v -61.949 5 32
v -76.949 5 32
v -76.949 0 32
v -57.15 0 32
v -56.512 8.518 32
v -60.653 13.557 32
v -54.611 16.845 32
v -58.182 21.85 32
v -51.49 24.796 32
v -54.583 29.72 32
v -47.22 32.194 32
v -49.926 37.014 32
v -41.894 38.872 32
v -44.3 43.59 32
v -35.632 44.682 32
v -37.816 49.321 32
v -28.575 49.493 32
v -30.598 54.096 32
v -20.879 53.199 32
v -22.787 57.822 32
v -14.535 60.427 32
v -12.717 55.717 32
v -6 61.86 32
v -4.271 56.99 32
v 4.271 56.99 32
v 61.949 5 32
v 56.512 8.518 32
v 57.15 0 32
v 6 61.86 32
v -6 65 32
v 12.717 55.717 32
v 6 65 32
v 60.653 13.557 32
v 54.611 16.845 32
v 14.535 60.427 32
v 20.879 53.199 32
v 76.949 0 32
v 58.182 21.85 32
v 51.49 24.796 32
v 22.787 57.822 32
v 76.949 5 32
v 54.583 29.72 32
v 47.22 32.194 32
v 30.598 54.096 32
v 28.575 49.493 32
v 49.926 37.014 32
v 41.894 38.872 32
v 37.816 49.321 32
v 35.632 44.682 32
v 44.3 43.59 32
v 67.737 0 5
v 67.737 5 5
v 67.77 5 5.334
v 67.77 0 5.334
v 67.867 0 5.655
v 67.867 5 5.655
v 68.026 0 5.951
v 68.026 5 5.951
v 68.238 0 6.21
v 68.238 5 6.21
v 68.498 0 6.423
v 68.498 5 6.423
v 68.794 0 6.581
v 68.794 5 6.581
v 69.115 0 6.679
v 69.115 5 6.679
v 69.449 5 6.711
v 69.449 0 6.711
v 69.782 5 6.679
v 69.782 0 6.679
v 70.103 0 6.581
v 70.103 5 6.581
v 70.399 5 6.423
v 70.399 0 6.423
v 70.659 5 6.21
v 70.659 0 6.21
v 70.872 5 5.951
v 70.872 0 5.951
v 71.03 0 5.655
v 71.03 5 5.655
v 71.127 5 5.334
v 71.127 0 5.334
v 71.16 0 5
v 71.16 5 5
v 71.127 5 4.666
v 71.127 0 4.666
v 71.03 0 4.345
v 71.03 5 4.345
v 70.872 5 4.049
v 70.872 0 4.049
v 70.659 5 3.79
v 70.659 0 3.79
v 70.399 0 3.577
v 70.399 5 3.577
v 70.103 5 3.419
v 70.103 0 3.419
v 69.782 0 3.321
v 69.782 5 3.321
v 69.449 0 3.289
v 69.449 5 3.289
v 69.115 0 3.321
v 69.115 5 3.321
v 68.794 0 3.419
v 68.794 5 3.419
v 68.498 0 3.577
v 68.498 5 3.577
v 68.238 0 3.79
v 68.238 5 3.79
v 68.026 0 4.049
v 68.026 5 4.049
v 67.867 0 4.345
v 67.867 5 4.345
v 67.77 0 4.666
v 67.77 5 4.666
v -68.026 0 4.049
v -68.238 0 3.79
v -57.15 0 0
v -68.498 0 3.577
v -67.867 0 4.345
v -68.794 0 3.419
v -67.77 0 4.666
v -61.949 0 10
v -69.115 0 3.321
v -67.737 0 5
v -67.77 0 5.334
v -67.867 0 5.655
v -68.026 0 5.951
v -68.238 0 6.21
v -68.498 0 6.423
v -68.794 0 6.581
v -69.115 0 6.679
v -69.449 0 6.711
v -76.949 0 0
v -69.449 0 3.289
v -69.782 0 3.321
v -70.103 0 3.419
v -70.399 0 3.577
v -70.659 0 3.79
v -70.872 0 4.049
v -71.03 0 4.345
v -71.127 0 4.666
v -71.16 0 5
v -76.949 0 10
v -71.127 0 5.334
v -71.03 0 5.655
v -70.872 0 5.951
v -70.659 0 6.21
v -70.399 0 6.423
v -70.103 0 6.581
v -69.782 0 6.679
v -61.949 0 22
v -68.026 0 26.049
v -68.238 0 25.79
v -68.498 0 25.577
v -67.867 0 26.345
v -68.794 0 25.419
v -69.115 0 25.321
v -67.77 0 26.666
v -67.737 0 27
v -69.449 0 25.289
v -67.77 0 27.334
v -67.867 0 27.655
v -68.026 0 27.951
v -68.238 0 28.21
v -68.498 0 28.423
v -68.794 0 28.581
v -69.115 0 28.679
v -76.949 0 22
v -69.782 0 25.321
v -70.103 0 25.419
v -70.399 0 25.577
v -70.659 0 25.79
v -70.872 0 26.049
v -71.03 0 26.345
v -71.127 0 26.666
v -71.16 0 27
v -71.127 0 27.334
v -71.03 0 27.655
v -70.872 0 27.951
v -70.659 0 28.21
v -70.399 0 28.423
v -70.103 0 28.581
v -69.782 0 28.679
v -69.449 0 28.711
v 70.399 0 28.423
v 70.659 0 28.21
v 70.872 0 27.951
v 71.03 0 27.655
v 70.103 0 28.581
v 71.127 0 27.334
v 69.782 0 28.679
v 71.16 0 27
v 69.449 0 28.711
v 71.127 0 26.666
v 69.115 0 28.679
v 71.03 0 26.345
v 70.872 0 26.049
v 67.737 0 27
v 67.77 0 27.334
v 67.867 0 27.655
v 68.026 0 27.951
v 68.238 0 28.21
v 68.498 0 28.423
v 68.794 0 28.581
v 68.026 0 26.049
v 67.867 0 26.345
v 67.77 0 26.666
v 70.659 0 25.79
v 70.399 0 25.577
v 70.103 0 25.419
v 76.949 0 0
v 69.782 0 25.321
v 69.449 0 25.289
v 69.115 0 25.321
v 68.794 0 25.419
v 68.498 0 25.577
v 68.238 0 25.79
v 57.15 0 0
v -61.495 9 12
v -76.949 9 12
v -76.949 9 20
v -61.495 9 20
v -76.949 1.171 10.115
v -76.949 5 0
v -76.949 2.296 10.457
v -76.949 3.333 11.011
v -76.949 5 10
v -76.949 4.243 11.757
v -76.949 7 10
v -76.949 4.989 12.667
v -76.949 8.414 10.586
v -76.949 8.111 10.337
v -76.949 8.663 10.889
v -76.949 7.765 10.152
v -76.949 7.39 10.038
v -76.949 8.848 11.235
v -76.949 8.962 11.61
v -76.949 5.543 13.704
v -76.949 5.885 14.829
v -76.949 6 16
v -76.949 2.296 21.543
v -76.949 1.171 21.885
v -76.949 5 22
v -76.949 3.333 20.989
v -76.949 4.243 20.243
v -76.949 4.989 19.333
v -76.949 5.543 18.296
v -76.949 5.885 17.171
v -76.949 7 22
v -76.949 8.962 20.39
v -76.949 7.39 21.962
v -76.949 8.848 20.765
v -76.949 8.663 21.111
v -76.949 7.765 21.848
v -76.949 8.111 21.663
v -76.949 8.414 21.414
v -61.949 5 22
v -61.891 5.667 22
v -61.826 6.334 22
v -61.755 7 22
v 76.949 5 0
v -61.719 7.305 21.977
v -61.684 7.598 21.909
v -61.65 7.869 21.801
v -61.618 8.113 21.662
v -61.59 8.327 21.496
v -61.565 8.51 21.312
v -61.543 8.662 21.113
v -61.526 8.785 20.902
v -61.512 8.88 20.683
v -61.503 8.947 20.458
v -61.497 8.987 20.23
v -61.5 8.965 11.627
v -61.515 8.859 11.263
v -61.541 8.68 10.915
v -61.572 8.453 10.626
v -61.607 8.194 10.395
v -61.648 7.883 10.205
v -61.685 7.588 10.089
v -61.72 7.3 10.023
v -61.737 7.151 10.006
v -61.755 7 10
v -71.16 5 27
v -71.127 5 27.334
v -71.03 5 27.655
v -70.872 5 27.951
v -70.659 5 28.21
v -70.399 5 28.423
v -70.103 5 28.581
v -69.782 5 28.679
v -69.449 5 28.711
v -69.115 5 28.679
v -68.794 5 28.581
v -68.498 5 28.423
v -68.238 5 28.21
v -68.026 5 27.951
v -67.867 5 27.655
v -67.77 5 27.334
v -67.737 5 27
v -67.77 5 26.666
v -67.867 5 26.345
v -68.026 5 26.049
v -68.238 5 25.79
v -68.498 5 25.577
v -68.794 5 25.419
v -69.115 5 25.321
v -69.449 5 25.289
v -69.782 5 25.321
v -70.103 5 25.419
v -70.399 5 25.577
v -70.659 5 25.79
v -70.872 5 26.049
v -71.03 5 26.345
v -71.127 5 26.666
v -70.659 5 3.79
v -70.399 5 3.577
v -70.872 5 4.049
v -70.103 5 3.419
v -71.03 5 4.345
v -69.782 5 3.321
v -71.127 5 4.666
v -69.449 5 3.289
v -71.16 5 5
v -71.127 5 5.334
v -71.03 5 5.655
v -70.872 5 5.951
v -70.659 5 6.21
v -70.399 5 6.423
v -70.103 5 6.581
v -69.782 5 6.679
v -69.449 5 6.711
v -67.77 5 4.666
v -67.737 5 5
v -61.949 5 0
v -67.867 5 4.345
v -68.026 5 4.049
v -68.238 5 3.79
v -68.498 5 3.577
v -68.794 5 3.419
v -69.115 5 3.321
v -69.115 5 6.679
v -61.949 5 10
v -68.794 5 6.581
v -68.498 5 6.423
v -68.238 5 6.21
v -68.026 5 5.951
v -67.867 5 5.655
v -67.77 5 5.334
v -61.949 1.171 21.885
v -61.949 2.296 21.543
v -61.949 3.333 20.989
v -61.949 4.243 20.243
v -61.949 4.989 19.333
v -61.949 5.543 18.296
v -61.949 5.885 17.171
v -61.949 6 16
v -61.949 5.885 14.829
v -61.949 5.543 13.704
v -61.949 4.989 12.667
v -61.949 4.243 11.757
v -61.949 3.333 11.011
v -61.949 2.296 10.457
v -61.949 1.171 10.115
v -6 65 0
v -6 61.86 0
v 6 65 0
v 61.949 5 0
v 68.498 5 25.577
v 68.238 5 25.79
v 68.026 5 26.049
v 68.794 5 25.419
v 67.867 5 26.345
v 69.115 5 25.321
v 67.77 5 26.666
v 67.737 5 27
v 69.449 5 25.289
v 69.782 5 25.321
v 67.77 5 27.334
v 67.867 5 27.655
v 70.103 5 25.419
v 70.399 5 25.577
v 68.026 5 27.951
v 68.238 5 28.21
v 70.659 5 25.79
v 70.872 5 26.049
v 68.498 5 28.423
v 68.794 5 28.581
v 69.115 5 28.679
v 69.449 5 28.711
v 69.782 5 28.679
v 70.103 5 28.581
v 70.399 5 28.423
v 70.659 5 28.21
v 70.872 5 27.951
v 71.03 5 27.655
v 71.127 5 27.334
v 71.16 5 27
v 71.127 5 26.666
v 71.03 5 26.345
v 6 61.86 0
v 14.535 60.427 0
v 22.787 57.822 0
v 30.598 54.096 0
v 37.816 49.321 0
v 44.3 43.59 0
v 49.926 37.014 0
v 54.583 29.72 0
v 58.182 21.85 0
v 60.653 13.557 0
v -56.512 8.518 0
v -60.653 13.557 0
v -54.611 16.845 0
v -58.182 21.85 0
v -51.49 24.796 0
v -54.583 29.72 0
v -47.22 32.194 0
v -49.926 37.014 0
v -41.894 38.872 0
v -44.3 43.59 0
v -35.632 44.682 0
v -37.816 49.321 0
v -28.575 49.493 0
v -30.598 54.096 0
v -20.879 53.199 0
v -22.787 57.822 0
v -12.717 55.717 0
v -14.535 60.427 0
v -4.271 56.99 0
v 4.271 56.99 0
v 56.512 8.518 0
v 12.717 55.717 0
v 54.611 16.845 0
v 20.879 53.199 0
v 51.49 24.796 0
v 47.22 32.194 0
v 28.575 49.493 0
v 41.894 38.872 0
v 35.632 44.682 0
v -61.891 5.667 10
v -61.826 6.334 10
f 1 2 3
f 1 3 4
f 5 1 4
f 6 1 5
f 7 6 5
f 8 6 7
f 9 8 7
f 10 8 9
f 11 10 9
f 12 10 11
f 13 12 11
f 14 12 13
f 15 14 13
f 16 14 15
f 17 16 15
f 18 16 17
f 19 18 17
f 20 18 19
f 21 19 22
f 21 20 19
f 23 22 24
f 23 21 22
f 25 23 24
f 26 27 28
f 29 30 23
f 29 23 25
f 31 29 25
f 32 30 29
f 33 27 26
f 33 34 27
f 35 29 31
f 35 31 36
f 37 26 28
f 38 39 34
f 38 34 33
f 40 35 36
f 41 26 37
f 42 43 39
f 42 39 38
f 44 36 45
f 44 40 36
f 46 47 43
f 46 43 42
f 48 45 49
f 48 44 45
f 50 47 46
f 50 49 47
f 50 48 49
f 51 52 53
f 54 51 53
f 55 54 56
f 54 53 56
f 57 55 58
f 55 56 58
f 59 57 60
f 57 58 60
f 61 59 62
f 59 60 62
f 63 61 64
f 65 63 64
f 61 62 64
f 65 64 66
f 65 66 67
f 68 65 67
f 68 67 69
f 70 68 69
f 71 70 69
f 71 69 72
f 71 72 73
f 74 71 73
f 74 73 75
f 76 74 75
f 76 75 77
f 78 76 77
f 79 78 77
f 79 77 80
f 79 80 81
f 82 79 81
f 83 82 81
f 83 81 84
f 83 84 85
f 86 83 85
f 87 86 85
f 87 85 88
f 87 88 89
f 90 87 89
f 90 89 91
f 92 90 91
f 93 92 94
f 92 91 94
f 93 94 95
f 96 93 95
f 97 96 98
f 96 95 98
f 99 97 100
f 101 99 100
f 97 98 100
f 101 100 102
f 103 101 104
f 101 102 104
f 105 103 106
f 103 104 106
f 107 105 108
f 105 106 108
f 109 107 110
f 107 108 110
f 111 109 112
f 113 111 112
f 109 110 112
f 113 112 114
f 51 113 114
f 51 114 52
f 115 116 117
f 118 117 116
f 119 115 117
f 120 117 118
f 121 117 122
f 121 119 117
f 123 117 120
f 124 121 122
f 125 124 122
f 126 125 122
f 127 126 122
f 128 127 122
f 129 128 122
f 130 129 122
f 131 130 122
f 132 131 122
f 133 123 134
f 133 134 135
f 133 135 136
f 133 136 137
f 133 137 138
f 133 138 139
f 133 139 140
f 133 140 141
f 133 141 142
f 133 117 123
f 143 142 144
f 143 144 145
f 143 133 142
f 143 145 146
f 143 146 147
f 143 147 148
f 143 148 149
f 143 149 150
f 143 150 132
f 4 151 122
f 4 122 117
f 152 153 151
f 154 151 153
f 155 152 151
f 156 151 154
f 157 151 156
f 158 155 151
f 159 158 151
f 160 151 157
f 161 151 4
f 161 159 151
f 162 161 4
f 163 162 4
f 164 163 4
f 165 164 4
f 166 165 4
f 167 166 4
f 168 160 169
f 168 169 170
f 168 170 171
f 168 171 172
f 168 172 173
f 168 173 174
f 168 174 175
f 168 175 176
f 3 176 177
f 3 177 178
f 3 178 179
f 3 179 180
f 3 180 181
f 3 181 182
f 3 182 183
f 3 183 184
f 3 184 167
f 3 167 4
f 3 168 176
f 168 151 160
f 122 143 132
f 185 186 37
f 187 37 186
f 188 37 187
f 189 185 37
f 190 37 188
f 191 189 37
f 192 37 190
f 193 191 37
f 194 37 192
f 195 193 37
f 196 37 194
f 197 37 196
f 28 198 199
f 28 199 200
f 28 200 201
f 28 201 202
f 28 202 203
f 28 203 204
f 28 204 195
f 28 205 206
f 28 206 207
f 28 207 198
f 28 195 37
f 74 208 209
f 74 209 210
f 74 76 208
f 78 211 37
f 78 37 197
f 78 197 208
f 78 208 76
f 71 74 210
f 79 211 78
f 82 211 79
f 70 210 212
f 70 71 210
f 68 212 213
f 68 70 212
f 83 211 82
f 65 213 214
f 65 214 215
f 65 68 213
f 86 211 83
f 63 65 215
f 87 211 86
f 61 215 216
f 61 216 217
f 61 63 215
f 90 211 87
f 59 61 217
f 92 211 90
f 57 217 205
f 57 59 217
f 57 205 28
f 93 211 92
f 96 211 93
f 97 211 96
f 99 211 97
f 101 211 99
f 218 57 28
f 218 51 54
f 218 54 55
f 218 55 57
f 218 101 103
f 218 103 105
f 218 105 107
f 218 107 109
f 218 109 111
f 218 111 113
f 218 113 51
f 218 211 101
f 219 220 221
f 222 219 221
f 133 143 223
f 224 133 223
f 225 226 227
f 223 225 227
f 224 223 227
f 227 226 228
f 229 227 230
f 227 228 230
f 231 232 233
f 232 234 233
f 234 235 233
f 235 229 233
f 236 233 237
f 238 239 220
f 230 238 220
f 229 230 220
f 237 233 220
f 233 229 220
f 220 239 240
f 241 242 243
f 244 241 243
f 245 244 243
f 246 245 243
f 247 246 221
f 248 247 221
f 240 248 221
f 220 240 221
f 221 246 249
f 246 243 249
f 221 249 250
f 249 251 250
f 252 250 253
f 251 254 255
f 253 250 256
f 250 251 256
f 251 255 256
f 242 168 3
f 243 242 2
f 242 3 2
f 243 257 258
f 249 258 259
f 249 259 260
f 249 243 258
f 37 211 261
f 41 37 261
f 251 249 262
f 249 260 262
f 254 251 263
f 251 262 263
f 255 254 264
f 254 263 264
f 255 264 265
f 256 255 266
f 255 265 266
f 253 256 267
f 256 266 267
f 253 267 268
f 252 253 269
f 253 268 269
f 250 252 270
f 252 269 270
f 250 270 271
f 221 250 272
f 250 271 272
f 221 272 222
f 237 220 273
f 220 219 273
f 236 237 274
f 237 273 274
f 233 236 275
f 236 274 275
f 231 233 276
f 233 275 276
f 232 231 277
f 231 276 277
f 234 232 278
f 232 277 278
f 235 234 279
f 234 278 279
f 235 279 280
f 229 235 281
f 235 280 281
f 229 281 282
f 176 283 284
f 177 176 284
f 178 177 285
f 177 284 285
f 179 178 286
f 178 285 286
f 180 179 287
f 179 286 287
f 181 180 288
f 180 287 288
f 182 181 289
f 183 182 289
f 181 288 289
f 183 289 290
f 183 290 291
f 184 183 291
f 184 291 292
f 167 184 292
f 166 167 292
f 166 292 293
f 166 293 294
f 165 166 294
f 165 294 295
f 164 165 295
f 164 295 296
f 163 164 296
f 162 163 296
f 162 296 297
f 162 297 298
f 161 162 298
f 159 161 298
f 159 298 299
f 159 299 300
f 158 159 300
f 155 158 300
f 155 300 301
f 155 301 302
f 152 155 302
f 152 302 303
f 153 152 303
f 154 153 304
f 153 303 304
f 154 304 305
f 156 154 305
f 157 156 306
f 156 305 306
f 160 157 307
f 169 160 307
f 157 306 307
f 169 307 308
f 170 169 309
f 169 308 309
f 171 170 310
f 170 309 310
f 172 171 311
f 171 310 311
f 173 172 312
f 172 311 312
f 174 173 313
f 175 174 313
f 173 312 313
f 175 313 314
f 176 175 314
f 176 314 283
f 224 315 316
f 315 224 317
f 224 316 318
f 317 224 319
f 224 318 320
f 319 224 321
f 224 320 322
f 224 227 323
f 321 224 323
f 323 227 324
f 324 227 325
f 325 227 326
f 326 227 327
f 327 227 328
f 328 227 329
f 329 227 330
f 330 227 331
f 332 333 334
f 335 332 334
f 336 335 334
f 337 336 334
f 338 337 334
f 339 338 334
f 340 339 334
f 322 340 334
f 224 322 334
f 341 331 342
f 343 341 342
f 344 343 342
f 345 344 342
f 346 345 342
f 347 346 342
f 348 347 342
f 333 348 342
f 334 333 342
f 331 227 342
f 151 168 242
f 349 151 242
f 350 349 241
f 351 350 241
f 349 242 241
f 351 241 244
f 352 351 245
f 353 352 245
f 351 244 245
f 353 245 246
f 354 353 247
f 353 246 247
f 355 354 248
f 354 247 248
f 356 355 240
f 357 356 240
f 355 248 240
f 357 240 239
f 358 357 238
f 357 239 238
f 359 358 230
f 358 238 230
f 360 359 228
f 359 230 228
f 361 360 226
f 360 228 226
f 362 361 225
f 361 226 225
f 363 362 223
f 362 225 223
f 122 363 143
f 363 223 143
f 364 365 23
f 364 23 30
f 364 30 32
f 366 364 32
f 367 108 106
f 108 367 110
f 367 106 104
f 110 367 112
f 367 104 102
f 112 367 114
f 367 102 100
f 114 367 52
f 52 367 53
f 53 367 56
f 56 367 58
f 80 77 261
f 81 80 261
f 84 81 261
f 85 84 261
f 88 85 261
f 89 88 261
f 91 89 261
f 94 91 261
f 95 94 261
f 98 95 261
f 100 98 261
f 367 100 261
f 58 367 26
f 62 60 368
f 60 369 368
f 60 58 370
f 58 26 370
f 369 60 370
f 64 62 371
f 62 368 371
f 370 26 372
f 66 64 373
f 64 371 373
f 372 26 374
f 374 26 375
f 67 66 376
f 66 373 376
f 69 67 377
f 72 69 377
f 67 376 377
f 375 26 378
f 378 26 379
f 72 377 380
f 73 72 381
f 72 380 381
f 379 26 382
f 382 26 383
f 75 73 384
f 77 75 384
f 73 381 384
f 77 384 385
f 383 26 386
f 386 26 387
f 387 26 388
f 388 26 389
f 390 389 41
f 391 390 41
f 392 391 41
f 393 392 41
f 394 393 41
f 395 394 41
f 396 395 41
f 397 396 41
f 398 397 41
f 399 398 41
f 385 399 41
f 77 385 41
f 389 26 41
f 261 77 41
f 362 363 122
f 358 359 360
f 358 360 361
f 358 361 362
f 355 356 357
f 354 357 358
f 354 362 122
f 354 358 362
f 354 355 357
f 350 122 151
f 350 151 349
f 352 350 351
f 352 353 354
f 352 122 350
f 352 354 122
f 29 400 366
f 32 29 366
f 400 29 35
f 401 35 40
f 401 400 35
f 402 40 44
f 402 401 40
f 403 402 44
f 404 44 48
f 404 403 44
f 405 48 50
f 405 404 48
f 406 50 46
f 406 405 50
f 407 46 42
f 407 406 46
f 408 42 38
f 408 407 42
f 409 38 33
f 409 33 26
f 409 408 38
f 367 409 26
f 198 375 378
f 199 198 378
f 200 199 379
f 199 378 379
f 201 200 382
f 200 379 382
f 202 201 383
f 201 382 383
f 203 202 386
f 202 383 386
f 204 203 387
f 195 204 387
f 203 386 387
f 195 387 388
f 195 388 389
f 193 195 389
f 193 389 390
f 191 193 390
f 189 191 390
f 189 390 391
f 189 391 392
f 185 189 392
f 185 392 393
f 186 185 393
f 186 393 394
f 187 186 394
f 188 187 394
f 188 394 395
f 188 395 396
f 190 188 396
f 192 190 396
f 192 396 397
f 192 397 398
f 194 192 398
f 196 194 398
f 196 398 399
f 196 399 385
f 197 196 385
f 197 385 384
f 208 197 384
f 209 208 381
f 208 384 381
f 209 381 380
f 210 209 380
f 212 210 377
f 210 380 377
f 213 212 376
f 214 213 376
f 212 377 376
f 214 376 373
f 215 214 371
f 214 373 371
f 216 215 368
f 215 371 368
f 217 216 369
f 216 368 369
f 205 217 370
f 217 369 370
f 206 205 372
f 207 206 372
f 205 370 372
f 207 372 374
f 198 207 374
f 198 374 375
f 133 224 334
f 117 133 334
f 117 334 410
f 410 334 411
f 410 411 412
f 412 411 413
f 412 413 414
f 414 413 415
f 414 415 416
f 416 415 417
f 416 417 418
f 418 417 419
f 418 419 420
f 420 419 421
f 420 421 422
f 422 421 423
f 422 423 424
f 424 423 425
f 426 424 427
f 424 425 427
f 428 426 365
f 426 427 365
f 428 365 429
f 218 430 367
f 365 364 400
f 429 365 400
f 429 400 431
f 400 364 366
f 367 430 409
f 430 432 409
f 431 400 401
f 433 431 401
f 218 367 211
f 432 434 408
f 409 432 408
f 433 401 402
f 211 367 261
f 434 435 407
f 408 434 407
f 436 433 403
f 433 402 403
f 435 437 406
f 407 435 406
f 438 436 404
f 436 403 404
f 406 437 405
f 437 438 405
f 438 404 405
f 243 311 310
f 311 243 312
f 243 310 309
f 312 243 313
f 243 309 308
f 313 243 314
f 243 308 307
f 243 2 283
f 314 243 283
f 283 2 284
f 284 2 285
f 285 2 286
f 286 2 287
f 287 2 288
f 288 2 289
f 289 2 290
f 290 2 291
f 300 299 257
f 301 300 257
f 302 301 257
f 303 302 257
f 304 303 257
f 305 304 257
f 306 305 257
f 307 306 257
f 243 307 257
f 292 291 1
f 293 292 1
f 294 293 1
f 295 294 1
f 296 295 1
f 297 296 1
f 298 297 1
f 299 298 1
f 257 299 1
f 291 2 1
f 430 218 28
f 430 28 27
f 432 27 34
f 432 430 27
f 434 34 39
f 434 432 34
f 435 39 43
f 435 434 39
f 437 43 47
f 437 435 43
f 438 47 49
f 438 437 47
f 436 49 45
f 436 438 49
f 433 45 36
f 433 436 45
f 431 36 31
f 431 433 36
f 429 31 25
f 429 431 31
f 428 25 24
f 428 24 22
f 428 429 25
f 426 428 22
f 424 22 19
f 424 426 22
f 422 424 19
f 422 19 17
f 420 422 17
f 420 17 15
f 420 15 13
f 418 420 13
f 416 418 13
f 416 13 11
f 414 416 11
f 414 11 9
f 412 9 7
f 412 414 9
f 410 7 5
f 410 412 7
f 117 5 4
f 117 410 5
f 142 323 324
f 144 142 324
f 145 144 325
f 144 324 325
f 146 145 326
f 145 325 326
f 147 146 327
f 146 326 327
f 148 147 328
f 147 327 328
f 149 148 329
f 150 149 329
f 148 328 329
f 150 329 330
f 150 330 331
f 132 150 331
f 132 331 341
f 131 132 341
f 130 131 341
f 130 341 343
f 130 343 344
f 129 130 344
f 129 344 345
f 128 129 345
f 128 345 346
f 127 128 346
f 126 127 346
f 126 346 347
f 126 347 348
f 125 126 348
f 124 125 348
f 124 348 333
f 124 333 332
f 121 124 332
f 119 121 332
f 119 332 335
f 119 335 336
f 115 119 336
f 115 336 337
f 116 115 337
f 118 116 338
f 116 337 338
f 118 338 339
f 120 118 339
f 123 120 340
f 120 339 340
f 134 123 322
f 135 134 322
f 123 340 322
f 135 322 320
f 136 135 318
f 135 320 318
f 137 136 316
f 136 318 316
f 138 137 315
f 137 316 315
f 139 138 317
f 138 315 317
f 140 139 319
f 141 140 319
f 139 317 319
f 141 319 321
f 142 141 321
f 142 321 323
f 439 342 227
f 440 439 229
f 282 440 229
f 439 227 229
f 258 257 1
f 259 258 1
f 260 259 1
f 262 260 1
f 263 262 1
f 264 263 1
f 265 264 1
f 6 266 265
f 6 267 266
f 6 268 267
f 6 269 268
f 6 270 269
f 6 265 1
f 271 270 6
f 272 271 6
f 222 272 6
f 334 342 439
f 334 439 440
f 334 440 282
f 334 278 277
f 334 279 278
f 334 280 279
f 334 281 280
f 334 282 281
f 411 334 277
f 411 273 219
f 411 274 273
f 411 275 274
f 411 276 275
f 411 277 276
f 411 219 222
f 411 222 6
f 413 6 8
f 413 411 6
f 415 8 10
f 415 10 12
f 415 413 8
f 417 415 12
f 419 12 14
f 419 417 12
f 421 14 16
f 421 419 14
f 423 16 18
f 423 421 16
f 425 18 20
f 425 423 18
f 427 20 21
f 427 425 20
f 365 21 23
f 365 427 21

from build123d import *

# Parameters (mm, degrees)
EXTRUDE_1_DEPTH     = 32
SKETCH_2_W          = 12
SKETCH_2_H          = 3.140299871
SKETCH_2_W_2        = 15
SKETCH_2_H_2        = 5
EXTRUDE_2_DEPTH     = 32
SKETCH_3_W          = 12
SKETCH_3_H          = 9
EXTRUDE_3_DEPTH     = 19
CUT_EXTRUDE_1_DEPTH = 15
FILLET_1_R          = 2
CUT_EXTRUDE_2_REACH = 104.689
SKETCH_5_R          = 1.711419382


with BuildPart() as part:
    # ｽｹｯﾁ1 → ﾎﾞｽ - 押し出し1 (new body)
    with BuildSketch(Plane.XY):
        with BuildLine():
            Line((-57.15, 0), (-62.15, 0))
            ThreePointArc((-62.15, 0), (0, 62.15), (62.15, 0))
            Line((62.15, 0), (57.15, 0))
            ThreePointArc((57.15, 0), (0, 57.15), (-57.15, 0))
        make_face()
    extrude(amount=EXTRUDE_1_DEPTH)

    # ｽｹｯﾁ2 → ﾎﾞｽ - 押し出し2 (add)
    with BuildSketch(Plane.XY.offset(32)):
        with Locations((0, 63.429850065)):
            Rectangle(SKETCH_2_W, SKETCH_2_H)
        with Locations((69.448547198, 2.5)):
            Rectangle(SKETCH_2_W_2, SKETCH_2_H_2)
        with Locations((-69.448547198, 2.5)):
            Rectangle(SKETCH_2_W_2, SKETCH_2_H_2)
    extrude(amount=-EXTRUDE_2_DEPTH)

    # ｽｹｯﾁ3 → ﾎﾞｽ - 押し出し3 (add)
    with BuildSketch(Plane.ZY.offset(76.948547198)):
        with Locations((16, 4.5)):
            Rectangle(SKETCH_3_W, SKETCH_3_H)
    extrude(amount=-EXTRUDE_3_DEPTH)

    # ｽｹｯﾁ4 → ｶｯﾄ - 押し出し1 (cut)
    with BuildSketch(Plane.ZY.offset(76.948547198)):
        with BuildLine():
            Line((10, 0), (22, 0))
            ThreePointArc((22, 0), (16, 6), (10, 0))
        make_face()
    extrude(amount=-CUT_EXTRUDE_1_DEPTH, mode=Mode.SUBTRACT)

    # ﾌｨﾚｯﾄ1
    fillet_1_edges = [part.edges().sort_by_distance(p)[0] for p in [
        (-69.22172268, 9, 10),
        (-69.22172268, 9, 22),
    ]]
    fillet(fillet_1_edges, radius=FILLET_1_R)

    # ｽｹｯﾁ5 → ｶｯﾄ - 押し出し2 (cut, up to next)
    with BuildSketch(Plane(origin=(0, 5, 0), x_dir=(1, 0, 0), z_dir=(0, 1, 0)), mode=Mode.PRIVATE) as cut_extrude_2_sk1:
        with Locations(Location((-69.448547198, -5, 0), (0, 0, 180))):
            Circle(SKETCH_5_R)
    cut_extrude_2_tool1 = extrude(cut_extrude_2_sk1.sketch, amount=-CUT_EXTRUDE_2_REACH, mode=Mode.PRIVATE) & part.part
    # ｽｹｯﾁ5 → ｶｯﾄ - 押し出し2 (cut, up to next)
    with BuildSketch(Plane(origin=(0, 5, 0), x_dir=(1, 0, 0), z_dir=(0, 1, 0)), mode=Mode.PRIVATE) as cut_extrude_2_sk2:
        with Locations(Location((-69.448547198, -27, 0), (0, 0, 180))):
            Circle(SKETCH_5_R)
    cut_extrude_2_tool2 = extrude(cut_extrude_2_sk2.sketch, amount=-CUT_EXTRUDE_2_REACH, mode=Mode.PRIVATE) & part.part
    # ｽｹｯﾁ5 → ｶｯﾄ - 押し出し2 (cut, up to next)
    with BuildSketch(Plane(origin=(0, 5, 0), x_dir=(1, 0, 0), z_dir=(0, 1, 0)), mode=Mode.PRIVATE) as cut_extrude_2_sk3:
        with Locations(Location((69.448547198, -27, 0), (0, 0, 180))):
            Circle(SKETCH_5_R)
    cut_extrude_2_tool3 = extrude(cut_extrude_2_sk3.sketch, amount=-CUT_EXTRUDE_2_REACH, mode=Mode.PRIVATE) & part.part
    # ｽｹｯﾁ5 → ｶｯﾄ - 押し出し2 (cut, up to next)
    with BuildSketch(Plane(origin=(0, 5, 0), x_dir=(1, 0, 0), z_dir=(0, 1, 0)), mode=Mode.PRIVATE) as cut_extrude_2_sk4:
        with Locations(Location((69.448547198, -5, 0), (0, 0, 180))):
            Circle(SKETCH_5_R)
    cut_extrude_2_tool4 = extrude(cut_extrude_2_sk4.sketch, amount=-CUT_EXTRUDE_2_REACH, mode=Mode.PRIVATE) & part.part
    add(cut_extrude_2_tool1.solids().sort_by_distance((-69.448547, 5, 5))[0], mode=Mode.SUBTRACT)
    add(cut_extrude_2_tool2.solids().sort_by_distance((-69.448547, 5, 27))[0], mode=Mode.SUBTRACT)
    add(cut_extrude_2_tool3.solids().sort_by_distance((69.448547, 5, 27))[0], mode=Mode.SUBTRACT)
    add(cut_extrude_2_tool4.solids().sort_by_distance((69.448547, 5, 5))[0], mode=Mode.SUBTRACT)


solid = part.part
